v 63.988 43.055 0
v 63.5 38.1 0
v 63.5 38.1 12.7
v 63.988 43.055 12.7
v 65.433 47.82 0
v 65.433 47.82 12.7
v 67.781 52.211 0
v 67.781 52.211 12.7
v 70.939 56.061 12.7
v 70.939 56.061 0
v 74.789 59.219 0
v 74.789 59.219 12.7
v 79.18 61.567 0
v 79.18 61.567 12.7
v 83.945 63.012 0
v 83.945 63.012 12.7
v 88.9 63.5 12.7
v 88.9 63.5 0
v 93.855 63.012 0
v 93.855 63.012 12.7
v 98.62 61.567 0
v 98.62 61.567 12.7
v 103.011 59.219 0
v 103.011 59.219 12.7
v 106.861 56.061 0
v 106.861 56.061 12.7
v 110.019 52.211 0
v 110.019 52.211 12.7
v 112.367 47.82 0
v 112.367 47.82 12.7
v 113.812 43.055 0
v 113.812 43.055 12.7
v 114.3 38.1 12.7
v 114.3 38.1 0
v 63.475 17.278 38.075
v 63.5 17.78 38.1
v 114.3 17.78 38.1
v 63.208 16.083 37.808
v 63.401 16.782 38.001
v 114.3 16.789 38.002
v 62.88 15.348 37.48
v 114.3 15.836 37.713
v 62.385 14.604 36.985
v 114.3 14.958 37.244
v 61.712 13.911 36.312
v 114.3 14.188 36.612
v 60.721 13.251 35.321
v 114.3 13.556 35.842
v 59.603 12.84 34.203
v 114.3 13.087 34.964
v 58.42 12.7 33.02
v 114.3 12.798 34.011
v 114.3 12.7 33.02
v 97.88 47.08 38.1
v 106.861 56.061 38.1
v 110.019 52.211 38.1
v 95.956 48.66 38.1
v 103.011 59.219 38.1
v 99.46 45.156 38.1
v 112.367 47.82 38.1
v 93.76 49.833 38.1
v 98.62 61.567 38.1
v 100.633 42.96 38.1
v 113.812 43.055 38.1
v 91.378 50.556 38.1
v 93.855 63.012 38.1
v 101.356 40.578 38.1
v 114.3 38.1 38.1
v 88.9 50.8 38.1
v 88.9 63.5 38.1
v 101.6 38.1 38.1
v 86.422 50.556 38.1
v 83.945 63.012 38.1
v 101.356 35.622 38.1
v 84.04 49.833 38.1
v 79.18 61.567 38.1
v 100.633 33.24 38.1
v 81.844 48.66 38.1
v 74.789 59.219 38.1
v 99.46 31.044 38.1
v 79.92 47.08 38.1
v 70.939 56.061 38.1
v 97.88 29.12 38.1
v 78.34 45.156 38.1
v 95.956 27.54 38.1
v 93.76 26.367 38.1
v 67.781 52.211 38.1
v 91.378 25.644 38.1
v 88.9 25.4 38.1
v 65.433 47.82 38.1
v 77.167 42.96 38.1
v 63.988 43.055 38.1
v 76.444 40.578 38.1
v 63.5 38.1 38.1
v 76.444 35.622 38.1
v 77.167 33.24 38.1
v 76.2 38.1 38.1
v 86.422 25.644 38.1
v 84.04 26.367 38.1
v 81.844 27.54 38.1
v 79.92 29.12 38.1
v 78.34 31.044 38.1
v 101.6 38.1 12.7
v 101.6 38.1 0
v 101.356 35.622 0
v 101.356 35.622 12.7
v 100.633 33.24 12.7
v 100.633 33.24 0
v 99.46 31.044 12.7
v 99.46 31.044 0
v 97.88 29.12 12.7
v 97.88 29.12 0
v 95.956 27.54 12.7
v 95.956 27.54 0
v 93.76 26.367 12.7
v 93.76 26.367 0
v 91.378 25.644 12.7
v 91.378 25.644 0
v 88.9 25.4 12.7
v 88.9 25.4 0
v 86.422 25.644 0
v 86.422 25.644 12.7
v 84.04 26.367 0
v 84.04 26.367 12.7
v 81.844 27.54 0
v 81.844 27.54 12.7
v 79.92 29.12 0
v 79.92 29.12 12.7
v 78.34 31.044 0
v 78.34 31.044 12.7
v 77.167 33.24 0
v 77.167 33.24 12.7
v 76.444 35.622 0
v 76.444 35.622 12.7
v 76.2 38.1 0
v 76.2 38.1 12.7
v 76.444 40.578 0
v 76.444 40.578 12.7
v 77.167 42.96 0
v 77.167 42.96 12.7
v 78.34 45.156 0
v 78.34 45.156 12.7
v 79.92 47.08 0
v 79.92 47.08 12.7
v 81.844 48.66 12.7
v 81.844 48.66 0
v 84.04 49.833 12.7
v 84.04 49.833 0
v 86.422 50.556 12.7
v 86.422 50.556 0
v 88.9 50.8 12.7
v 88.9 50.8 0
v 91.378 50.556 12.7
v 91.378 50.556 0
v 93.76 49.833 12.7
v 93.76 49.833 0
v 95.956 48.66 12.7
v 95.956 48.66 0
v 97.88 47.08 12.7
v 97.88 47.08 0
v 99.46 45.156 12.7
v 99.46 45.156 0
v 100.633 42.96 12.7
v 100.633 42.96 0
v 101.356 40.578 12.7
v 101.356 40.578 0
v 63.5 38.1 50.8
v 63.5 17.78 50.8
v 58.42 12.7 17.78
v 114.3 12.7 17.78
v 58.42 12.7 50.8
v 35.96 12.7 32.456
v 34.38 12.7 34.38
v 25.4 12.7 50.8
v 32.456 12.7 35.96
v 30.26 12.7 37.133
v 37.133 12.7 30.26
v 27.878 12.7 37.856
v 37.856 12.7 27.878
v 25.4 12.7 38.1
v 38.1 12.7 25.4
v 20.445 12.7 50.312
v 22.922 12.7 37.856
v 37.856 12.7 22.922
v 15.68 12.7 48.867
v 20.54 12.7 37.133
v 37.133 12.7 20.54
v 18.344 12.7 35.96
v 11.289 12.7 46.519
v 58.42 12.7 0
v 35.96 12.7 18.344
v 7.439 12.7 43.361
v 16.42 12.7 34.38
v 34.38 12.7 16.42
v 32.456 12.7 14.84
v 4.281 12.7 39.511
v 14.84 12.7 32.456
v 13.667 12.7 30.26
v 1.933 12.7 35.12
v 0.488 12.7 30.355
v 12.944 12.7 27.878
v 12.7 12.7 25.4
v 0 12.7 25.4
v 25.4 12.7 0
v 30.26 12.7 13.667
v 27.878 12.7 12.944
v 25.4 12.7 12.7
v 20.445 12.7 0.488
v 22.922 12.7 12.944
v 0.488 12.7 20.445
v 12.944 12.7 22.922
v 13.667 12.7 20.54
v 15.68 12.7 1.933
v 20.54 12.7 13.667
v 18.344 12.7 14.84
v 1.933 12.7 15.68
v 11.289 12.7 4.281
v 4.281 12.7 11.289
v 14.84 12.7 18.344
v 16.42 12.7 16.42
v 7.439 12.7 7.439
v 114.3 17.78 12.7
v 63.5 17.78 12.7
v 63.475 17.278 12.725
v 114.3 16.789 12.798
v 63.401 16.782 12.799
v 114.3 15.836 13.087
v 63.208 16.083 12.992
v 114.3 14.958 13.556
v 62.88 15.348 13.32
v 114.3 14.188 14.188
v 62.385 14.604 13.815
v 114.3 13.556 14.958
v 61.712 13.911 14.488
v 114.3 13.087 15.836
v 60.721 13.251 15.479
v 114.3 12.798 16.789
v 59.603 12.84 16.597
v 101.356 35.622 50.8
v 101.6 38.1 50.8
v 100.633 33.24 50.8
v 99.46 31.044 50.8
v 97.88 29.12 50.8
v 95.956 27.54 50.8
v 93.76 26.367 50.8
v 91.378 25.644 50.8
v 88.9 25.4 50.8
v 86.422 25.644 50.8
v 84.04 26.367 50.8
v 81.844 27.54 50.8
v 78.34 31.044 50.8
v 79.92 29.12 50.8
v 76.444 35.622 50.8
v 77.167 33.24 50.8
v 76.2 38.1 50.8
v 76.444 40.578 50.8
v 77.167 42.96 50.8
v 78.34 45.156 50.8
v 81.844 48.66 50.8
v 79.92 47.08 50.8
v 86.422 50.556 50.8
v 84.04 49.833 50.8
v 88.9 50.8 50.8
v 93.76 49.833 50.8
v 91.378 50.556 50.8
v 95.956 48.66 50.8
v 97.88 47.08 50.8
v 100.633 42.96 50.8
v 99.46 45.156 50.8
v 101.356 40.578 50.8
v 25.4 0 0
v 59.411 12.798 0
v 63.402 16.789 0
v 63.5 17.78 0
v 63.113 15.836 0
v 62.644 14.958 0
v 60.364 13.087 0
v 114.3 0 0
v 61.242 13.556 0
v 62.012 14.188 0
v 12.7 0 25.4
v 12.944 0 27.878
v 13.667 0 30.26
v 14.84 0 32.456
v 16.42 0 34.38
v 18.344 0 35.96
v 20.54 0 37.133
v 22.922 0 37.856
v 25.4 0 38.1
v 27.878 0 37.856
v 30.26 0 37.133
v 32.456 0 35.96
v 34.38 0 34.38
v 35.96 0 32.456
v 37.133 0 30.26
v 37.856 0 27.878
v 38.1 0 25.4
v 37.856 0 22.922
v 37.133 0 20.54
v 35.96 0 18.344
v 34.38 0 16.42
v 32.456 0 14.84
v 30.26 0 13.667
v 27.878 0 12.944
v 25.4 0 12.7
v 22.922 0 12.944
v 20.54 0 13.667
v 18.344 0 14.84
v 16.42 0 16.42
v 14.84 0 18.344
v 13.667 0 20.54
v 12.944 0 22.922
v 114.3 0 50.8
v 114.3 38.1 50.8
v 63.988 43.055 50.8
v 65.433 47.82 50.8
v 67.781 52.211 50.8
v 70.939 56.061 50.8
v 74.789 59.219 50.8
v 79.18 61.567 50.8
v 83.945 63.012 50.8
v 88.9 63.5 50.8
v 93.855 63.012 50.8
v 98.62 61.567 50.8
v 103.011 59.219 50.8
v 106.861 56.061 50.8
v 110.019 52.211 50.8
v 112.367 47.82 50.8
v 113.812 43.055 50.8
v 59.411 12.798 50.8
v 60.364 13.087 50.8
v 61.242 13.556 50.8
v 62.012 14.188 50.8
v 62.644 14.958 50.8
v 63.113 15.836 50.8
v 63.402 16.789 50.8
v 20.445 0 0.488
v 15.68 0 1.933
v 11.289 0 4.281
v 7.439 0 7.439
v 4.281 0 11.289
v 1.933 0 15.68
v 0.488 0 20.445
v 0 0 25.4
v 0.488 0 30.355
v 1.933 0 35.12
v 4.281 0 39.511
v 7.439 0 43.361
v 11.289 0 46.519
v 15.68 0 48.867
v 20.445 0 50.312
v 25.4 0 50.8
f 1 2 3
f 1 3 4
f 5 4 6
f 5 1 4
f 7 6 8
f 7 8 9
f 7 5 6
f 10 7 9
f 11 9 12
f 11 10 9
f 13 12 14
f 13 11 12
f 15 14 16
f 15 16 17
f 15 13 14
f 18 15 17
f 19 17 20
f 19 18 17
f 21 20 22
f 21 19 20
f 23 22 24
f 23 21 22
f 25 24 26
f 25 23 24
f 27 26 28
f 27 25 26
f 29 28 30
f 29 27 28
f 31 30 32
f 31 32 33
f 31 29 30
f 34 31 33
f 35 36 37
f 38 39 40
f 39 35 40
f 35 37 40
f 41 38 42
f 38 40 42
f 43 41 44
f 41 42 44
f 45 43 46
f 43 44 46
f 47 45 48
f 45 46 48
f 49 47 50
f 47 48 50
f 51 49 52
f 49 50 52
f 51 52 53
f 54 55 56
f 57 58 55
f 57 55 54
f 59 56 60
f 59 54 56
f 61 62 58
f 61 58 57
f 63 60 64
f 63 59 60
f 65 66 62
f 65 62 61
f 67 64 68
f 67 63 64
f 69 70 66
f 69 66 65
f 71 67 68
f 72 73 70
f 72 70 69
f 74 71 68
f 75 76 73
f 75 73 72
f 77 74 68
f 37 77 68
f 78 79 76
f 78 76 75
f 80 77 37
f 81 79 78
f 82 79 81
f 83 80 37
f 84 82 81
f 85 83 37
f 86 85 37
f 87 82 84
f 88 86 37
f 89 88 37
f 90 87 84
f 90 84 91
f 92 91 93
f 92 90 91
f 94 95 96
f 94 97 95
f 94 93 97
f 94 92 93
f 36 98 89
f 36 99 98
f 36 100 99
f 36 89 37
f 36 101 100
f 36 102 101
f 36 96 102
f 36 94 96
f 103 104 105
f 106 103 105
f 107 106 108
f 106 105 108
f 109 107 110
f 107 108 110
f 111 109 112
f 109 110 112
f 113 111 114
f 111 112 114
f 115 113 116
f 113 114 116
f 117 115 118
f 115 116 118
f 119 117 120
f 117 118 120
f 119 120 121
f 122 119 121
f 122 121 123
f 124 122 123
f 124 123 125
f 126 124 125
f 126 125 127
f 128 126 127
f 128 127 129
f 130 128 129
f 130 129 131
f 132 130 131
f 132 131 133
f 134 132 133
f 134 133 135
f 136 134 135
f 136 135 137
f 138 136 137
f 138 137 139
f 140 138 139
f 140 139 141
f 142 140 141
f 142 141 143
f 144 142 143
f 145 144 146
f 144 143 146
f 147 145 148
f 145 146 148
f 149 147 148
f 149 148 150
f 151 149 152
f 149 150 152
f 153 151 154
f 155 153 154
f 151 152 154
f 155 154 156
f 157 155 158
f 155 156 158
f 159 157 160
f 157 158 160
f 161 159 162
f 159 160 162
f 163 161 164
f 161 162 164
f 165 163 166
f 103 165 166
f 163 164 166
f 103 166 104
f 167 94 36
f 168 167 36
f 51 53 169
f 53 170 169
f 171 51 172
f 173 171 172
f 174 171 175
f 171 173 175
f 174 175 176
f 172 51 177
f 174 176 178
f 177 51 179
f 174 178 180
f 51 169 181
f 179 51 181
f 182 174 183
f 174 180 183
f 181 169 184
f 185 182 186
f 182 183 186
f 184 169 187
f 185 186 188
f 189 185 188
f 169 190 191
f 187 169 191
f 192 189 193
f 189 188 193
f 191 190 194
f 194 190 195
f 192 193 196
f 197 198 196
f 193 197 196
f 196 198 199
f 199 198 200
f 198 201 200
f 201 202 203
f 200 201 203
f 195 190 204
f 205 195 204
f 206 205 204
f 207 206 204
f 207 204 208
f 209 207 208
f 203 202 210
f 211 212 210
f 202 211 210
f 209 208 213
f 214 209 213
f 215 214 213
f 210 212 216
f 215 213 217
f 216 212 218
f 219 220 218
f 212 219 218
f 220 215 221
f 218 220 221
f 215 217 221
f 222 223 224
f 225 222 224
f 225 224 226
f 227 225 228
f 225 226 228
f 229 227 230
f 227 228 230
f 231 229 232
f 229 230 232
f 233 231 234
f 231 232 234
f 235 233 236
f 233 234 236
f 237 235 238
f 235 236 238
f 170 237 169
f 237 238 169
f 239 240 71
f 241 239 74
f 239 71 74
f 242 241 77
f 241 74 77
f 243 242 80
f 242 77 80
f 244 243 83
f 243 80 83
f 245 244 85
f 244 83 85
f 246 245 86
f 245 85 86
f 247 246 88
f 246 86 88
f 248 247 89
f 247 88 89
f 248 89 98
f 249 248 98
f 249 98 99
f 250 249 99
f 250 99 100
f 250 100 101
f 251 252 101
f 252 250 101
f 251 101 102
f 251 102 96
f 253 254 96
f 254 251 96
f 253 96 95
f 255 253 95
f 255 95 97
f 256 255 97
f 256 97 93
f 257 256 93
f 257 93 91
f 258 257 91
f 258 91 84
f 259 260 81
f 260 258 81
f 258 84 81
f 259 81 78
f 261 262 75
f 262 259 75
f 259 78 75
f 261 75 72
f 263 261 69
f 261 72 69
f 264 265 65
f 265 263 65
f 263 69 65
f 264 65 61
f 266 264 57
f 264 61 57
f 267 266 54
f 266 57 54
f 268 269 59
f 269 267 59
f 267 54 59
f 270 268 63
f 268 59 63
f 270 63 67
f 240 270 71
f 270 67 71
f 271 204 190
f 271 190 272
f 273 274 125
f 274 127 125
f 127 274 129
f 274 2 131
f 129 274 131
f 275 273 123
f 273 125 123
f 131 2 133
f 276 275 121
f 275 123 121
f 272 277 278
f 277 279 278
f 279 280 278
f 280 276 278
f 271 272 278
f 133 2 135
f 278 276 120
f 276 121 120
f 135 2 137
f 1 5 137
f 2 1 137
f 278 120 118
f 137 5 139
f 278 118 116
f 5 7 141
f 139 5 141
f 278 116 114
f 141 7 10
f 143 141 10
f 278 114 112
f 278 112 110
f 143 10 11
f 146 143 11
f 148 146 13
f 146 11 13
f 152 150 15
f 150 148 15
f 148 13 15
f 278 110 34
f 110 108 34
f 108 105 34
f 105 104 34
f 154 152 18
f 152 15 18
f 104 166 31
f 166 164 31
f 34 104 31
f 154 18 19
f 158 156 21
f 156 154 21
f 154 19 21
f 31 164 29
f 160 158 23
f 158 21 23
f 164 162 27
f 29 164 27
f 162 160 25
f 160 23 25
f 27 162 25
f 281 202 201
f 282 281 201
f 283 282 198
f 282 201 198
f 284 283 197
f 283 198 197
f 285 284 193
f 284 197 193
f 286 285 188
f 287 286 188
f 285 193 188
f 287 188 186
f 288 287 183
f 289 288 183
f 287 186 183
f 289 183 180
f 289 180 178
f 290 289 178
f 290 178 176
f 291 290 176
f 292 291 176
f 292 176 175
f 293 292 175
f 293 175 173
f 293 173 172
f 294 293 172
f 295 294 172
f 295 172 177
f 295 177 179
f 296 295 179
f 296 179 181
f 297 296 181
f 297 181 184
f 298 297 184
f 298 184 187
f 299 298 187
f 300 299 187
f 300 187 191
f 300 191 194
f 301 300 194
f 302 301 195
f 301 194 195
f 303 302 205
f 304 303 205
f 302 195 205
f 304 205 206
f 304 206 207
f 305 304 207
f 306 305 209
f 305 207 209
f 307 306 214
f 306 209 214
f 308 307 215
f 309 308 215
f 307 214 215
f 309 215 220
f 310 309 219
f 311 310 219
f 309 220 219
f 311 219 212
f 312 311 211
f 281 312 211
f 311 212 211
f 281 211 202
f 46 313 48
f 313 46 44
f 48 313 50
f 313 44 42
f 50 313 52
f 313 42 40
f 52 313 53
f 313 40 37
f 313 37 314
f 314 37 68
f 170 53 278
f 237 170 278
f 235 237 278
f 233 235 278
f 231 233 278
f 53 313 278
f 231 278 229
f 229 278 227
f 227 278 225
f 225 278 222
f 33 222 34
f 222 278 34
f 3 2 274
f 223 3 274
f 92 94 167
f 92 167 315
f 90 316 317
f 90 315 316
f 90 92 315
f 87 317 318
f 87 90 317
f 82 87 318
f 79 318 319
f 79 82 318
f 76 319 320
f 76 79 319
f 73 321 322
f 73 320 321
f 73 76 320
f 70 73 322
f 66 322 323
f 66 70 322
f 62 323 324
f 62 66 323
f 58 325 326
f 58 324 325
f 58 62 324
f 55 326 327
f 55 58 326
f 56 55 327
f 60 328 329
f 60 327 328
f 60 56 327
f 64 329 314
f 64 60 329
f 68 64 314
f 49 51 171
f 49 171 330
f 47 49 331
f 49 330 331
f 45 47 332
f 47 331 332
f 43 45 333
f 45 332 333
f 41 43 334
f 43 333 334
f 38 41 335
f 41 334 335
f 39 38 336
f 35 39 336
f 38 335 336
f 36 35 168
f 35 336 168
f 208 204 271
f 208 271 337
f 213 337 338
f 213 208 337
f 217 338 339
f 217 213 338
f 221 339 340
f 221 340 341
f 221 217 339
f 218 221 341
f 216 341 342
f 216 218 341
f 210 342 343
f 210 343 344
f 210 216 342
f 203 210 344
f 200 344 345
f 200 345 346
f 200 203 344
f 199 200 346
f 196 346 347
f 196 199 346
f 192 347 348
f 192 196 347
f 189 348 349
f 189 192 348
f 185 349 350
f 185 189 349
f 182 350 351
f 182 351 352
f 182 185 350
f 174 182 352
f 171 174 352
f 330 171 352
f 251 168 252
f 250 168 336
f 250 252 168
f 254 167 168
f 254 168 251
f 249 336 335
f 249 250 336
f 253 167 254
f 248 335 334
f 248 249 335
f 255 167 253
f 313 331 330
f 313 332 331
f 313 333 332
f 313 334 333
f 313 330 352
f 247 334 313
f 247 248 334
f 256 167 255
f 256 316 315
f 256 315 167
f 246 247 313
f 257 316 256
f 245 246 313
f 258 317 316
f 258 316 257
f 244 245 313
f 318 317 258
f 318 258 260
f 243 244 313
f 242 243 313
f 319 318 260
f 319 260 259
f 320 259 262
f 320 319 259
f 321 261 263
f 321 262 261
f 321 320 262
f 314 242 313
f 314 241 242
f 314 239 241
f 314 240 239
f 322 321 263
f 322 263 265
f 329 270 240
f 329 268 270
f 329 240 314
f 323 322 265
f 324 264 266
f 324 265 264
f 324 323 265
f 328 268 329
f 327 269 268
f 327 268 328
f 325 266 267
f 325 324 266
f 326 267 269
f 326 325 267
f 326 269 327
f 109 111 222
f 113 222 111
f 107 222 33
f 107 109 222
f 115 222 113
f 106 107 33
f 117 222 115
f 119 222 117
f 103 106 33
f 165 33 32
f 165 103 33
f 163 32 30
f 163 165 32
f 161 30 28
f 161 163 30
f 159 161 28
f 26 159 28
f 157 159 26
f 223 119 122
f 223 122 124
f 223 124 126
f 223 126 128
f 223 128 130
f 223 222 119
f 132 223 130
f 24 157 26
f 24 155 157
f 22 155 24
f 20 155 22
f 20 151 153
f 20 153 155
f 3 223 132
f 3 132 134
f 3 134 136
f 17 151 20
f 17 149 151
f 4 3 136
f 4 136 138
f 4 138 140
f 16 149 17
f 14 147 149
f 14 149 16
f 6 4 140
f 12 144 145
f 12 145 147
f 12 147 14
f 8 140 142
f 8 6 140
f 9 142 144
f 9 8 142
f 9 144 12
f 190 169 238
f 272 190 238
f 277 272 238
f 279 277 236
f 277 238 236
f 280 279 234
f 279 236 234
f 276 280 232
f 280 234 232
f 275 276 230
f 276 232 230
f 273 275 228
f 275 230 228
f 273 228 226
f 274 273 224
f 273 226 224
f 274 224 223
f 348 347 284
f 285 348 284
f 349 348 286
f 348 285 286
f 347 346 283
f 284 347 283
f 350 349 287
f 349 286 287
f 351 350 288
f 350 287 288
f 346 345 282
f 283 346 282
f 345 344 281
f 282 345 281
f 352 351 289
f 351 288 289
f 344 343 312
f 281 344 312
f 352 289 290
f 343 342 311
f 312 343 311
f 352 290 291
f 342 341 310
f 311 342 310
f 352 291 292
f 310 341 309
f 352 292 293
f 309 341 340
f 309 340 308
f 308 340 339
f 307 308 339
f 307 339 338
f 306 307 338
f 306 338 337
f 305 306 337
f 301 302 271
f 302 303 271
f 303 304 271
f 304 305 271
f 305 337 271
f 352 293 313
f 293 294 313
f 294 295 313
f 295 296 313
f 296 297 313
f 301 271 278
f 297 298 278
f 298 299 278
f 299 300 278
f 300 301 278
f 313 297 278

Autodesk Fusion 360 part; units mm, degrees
sketch "Sketch5" plane through (0, 0, 0) normal (0, 0, 1) x (1, 0, 0)
  line L0 (0, 0) -> (114.3, 0)
  line L1 (114.3, 0) -> (114.3, 38.1)
  line L2 (114.3, 63.5) -> (104.14, 63.5)
  line L3 (0, 12.7) -> (0, 0)
  circle A0 centre (88.9, 38.1) radius 12.7
  arc A1 (114.3, 38.1) -> (63.5, 38.1) centre (88.9, 38.1) ccw
  line L4 (63.5, 38.1) -> (63.5, 12.7)
  line L5 (63.5, 12.7) -> (60.96, 12.7)
  line L6 (60.96, 12.7) -> (0, 12.7)
  dimension "d17" = 114.3
  dimension "d18" = 63.5
  dimension "d19" = 25.4
  dimension "d21" = 25.4
  dimension "d22" = 25.4
extrude "Extrude4" add sketch "Sketch5" along normal blind 50.8
sketch "Sketch6" plane through (0, 12.7, 0) normal (0, 1, 0) x (-1, 0, 0)
  line L0 (-63.5, 0) -> (0, 0)
  line L1 (0, 0) -> (0, 50.8)
  line L2 (0, 50.8) -> (-63.5, 50.8)
  line L3 (-63.5, 50.8) -> (-63.5, 0)
  circle A0 centre (-25.4, 25.4) radius 12.7
  arc A1 (-25.4, 0) -> (-25.4, 50.8) centre (-25.4, 25.4) ccw
  dimension "d25" = 25.4
extrude "Extrude5" cut sketch "Sketch6" against normal blind 15.24 contours L0 L1 A1 | L1 L2 A1 | A0
sketch "Sketch7" plane through (63.5, 0, 0) normal (-1, 0, 0) x (0, 0, 1)
  line L0 (0, 38.1) -> (0, 12.7)
  line L1 (0, 12.7) -> (50.8, 12.7)
  line L2 (50.8, 12.7) -> (50.8, 38.1)
  line L3 (50.8, 38.1) -> (0, 38.1)
  line L4 (12.7, 63.5) -> (38.1, 63.5)
  line L5 (38.1, 63.5) -> (38.1, 12.7)
  line L6 (38.1, 12.7) -> (12.7, 12.7)
  line L7 (12.7, 12.7) -> (12.7, 63.5)
extrude "Extrude6" cut sketch "Sketch7" against normal blind 60.96 contours L3 L4 L5 L7 | L1 L3 L5 L6 L7
fillet "Fillet1" radius 5.08 1 edges at (63.5, 12.7, 44.45)
fillet "Fillet2" radius 5.08 1 edges at (63.5, 12.7, 6.35)
fillet "Fillet3" radius 5.08 1 edges at (86.36, 12.7, 12.7)
fillet "Fillet4" radius 5.08 1 edges at (86.36, 12.7, 38.1)
